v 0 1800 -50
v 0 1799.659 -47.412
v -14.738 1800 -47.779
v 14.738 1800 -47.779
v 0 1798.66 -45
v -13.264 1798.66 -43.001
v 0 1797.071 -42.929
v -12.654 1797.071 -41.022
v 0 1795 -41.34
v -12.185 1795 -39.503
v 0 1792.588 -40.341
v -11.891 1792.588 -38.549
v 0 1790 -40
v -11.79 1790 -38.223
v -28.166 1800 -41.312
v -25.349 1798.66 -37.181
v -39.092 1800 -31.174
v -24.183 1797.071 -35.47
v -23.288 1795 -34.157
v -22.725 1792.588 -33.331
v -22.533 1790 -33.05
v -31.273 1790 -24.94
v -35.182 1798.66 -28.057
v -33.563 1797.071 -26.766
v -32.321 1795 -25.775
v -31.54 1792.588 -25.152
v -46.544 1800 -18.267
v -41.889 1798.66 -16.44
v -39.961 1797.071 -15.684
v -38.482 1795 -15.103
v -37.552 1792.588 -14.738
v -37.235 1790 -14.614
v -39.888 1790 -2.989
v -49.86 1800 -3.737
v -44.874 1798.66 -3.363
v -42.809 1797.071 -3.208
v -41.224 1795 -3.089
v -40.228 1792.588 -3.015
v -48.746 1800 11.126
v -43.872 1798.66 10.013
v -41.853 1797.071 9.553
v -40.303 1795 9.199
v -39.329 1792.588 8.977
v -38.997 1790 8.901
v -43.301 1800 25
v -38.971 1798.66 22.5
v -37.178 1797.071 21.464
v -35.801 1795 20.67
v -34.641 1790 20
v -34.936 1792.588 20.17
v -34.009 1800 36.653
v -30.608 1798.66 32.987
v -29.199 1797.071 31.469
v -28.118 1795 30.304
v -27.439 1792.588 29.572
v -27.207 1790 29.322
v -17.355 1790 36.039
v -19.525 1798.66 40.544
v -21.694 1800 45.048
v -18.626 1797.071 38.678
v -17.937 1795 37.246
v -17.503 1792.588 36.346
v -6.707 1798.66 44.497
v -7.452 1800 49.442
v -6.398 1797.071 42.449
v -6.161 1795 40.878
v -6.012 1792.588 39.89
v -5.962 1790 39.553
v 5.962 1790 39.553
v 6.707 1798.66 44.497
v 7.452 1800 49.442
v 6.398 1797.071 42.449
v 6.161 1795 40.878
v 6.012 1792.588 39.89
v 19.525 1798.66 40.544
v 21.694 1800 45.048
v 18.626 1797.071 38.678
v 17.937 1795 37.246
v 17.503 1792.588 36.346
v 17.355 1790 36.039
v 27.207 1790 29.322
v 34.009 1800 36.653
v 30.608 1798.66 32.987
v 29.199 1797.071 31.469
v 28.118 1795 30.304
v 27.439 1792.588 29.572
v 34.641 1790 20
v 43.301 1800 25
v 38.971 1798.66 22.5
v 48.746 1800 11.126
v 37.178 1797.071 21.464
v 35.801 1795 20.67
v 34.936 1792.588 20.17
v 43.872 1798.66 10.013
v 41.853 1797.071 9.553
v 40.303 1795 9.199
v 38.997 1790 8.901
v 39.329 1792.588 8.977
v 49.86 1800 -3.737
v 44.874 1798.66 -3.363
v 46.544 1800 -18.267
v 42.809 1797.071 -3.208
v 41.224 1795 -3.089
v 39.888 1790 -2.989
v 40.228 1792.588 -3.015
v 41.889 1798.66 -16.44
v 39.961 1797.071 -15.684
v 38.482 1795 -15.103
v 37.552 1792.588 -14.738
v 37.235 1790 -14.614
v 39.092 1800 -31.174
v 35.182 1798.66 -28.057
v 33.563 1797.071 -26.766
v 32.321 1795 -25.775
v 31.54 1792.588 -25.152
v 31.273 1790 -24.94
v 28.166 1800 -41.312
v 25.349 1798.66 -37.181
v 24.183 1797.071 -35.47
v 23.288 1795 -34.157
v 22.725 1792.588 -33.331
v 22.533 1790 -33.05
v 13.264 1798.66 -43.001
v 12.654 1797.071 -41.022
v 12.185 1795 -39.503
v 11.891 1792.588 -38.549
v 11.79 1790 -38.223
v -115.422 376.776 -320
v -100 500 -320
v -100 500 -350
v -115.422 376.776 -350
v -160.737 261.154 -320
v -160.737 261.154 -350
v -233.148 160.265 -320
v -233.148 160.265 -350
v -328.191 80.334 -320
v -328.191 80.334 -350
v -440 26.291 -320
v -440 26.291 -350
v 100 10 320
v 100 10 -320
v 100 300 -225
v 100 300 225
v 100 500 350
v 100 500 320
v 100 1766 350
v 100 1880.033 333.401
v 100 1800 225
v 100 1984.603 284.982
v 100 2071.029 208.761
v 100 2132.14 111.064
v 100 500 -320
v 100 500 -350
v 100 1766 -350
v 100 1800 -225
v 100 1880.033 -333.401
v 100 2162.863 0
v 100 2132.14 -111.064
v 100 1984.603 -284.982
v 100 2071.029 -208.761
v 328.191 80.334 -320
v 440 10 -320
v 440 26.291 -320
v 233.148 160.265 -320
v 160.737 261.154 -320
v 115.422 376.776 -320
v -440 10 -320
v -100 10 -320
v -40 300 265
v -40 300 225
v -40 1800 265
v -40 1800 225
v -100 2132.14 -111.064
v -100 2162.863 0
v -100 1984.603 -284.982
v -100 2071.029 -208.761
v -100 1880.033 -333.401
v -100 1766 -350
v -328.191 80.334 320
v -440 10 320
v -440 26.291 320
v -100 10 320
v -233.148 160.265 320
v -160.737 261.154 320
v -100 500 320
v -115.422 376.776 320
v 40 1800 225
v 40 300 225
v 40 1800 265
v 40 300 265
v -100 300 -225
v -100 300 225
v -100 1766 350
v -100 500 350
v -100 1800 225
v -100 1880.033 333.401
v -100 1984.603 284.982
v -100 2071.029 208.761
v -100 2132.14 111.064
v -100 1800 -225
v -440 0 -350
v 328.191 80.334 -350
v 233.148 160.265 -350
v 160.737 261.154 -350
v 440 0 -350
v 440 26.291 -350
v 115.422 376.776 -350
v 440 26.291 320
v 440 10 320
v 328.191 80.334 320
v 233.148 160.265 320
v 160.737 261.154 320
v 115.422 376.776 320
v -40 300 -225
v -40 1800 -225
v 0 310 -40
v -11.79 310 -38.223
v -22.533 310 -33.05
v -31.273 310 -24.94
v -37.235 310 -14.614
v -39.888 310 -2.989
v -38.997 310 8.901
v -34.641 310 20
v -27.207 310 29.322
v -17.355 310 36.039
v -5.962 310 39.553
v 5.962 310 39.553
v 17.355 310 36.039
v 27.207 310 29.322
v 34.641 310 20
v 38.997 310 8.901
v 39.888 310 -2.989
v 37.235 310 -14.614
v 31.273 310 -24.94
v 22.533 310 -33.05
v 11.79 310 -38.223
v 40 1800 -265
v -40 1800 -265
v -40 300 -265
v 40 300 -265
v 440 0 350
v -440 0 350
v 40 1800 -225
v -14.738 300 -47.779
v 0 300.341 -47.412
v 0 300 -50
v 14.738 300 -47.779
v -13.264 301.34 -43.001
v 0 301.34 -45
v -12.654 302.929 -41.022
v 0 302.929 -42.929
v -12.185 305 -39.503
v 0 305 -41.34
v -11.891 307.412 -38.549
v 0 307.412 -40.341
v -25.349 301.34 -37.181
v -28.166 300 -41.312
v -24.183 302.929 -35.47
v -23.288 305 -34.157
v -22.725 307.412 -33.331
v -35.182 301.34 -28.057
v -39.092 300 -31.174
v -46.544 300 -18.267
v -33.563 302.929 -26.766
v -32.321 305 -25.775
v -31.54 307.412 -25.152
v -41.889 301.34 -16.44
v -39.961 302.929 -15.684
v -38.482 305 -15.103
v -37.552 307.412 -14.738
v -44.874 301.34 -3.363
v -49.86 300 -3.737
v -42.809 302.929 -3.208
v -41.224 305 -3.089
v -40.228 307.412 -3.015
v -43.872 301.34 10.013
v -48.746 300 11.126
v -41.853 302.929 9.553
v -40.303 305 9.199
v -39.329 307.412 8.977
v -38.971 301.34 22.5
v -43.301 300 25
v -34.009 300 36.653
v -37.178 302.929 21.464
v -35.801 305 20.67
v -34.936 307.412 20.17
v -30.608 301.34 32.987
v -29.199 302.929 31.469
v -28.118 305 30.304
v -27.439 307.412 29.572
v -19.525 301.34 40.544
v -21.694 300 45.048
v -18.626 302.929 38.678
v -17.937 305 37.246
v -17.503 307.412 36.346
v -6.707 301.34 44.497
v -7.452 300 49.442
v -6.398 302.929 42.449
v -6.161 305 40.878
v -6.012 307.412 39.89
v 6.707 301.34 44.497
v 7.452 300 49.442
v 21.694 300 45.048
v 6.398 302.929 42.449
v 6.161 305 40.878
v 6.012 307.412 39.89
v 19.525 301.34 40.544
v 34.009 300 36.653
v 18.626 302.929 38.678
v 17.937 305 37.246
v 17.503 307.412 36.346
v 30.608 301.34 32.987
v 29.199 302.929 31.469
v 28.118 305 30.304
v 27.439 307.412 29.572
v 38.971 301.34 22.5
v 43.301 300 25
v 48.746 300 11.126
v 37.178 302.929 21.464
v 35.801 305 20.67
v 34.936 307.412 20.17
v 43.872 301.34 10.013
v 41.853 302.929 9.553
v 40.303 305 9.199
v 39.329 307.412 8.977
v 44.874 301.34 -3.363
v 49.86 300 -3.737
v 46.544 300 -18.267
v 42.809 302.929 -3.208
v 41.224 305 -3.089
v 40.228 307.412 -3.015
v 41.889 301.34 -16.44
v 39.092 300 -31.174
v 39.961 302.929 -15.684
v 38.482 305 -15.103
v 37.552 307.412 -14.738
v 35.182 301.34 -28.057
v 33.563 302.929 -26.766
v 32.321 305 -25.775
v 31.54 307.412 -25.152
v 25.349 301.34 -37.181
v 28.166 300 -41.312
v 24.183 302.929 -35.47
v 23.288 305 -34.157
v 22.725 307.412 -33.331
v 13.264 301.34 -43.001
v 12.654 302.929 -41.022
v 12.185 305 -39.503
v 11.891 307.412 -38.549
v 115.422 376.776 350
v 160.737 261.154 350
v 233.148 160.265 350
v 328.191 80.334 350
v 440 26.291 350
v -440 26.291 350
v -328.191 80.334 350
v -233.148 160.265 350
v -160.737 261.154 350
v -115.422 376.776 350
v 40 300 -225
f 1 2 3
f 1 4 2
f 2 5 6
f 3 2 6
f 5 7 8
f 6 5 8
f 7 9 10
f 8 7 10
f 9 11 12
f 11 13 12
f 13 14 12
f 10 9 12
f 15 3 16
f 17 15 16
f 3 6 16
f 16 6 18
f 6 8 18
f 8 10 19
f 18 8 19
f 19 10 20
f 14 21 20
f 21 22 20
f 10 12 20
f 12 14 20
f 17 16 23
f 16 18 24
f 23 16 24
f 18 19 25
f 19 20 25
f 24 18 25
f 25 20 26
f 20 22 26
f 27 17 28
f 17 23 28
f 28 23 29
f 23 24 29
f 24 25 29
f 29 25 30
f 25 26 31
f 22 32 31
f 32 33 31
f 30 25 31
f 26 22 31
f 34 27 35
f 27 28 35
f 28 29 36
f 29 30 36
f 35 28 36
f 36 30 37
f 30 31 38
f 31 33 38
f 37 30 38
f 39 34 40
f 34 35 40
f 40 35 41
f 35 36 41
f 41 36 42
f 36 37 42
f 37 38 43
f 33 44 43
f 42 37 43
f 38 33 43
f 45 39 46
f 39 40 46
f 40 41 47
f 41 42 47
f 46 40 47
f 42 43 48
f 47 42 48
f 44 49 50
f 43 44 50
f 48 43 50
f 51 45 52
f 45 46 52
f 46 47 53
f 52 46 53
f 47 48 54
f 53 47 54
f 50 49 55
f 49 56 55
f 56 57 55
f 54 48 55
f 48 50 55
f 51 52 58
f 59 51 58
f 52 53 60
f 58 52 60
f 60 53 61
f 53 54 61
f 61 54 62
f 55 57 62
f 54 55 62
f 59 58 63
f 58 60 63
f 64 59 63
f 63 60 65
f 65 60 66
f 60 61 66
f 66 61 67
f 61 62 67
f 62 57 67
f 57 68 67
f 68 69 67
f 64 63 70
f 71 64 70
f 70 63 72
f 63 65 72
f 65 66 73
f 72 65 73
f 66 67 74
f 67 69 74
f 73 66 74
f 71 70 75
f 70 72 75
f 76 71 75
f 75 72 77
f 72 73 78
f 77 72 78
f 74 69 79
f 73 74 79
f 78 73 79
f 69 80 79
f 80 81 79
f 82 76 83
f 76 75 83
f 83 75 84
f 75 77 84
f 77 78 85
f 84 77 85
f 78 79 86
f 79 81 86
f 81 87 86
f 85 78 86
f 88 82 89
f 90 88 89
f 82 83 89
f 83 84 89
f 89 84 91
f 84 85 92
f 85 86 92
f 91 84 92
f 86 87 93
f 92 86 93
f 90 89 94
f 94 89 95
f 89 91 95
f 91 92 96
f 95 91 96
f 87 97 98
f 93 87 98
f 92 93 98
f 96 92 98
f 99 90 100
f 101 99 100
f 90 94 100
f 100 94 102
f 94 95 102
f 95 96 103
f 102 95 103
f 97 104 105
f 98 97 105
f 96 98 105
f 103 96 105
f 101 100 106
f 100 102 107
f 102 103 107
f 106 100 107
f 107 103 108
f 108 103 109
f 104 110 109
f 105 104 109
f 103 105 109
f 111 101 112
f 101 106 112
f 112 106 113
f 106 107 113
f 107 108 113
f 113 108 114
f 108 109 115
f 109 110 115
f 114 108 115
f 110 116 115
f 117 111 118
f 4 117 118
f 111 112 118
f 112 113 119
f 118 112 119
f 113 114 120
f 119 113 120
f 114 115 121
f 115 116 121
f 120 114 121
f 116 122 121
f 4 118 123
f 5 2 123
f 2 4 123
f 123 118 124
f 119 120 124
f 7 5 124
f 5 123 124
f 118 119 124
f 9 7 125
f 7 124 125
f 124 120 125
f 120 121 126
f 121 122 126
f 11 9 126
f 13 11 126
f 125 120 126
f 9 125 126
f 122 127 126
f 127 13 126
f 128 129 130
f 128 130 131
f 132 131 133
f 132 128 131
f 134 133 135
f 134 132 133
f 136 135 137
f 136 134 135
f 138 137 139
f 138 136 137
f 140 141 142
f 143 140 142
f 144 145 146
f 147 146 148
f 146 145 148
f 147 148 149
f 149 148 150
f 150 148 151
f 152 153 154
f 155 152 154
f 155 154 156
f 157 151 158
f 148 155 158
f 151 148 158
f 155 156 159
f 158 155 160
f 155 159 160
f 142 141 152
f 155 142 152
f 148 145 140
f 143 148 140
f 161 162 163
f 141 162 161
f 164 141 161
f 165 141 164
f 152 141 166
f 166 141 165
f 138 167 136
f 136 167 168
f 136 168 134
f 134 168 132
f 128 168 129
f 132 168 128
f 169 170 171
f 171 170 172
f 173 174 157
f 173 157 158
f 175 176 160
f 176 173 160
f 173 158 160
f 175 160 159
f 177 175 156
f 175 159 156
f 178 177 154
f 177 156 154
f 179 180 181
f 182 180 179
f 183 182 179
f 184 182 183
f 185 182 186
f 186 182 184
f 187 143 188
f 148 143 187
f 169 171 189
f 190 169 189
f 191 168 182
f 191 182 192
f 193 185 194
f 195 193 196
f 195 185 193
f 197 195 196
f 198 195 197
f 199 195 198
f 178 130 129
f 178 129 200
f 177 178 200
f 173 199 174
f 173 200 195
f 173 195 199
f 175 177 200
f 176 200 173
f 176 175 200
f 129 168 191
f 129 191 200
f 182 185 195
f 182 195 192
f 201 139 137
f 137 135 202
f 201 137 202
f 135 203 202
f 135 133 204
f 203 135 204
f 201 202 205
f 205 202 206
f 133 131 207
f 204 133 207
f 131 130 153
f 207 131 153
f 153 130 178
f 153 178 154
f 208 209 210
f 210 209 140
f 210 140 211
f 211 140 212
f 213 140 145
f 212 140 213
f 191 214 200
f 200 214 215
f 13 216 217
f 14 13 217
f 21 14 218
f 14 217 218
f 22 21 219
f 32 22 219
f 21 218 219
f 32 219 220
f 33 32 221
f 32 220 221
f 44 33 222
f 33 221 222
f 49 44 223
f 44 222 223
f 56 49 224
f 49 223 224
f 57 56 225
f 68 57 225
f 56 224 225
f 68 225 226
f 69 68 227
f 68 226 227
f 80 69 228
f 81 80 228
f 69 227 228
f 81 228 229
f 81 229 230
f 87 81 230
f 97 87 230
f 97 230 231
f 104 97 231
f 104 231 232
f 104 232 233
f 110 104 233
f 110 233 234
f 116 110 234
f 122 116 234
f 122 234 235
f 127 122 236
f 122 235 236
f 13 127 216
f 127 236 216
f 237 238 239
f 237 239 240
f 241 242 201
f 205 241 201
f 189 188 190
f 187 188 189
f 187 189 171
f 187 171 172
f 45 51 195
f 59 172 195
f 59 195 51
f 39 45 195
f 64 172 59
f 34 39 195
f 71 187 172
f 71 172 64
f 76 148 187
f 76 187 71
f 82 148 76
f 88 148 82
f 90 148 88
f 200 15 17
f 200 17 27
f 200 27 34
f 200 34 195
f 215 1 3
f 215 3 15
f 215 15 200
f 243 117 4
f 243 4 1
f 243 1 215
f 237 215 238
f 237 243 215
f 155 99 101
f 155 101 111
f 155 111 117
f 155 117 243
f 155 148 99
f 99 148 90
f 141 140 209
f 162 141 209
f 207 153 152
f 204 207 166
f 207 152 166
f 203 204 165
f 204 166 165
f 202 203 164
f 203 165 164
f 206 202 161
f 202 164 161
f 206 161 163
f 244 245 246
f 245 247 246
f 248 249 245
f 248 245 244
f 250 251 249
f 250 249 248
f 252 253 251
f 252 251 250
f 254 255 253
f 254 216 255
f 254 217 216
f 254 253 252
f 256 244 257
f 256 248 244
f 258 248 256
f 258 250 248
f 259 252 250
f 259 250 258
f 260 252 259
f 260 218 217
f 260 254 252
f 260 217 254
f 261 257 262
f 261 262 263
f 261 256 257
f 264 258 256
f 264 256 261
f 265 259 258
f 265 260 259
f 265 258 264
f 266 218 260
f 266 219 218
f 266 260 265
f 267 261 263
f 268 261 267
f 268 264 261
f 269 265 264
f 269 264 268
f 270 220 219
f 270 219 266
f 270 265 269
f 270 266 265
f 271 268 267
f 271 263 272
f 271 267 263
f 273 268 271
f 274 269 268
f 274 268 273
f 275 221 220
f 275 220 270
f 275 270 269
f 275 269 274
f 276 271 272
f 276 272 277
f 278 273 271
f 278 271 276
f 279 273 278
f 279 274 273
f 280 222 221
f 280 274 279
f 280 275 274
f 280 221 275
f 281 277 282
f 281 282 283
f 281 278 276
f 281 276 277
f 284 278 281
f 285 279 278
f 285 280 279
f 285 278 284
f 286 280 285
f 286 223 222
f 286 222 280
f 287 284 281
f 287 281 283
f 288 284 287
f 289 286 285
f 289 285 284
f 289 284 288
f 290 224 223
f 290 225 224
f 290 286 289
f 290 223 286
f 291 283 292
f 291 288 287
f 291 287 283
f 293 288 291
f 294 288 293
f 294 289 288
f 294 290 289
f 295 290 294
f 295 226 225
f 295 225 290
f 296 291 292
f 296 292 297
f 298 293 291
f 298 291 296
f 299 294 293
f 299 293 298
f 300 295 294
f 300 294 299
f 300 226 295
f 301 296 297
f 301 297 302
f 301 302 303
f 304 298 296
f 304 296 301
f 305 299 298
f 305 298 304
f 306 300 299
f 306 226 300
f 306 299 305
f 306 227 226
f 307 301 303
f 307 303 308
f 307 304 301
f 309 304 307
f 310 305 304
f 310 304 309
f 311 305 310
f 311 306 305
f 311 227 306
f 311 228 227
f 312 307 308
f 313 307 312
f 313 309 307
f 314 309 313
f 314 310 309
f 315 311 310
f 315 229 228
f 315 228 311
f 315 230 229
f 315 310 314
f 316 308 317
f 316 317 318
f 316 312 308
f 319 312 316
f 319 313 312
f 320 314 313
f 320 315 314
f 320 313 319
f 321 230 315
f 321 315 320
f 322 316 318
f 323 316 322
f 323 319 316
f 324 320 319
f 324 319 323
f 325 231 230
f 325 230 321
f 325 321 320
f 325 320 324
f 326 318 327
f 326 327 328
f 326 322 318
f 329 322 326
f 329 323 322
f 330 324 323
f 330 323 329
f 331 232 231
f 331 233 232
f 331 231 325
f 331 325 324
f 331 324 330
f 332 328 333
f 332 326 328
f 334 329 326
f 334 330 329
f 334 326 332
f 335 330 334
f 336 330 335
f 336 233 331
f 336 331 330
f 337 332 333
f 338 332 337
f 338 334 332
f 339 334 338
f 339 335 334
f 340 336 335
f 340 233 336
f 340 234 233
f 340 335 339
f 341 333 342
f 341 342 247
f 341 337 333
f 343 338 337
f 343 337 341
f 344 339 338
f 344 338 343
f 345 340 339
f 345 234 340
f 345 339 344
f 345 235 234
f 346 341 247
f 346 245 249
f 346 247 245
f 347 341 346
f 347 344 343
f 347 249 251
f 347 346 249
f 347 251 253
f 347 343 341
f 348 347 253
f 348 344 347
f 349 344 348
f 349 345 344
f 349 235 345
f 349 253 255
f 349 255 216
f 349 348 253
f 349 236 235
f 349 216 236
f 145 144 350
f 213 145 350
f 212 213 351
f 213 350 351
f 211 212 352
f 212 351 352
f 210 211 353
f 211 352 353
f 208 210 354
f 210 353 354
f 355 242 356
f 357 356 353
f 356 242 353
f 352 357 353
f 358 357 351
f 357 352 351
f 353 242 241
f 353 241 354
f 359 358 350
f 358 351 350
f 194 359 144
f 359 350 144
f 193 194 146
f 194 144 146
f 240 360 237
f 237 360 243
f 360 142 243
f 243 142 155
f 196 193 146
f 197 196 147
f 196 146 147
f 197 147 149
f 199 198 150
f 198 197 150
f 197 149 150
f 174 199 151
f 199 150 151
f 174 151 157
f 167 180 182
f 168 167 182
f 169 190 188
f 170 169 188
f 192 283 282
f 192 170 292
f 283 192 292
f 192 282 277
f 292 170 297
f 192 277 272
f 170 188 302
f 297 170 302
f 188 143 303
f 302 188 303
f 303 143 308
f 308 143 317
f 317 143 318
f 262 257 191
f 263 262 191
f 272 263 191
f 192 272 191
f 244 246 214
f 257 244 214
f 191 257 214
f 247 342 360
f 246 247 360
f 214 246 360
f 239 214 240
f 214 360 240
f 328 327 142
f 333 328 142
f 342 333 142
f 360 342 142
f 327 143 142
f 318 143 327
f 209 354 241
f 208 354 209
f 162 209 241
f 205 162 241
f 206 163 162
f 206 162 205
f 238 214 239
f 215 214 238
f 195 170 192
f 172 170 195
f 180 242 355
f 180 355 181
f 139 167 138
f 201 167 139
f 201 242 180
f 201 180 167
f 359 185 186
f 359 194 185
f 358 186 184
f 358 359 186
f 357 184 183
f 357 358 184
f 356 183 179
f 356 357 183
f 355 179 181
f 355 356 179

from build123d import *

# Parameters (mm, degrees)
AUFSATZ_LINEAR_AUSTRAGEN1_DEPTH             = 350
AUFSATZ_LINEAR_AUSTRAGEN1_DEPTH_BACK        = 350
SKIZZE1_W                                   = 200
SKIZZE1_H                                   = 2166
VERRUNDUNG1_R                               = 400
SKIZZE2_W                                   = 450
SKIZZE2_H                                   = 1500
SCHNITT_LINEAR_AUSTRAGEN1_DEPTH             = 200
SKIZZE4_W                                   = 80
SKIZZE4_H                                   = 1500
SCHNITT_LINEAR_AUSTRAGEN2_DEPTH             = 40
SKIZZE5_R                                   = 40
AUFSATZ_LINEAR_AUSTRAGEN2_DEPTH             = 1500
VERRUNDUNG2_R                               = 10
SKIZZE6_W                                   = 30
SKIZZE6_H                                   = 500
AUFSATZ_LINEAR_AUSTRAGEN3_DEPTH             = 500
SKIZZE7_W                                   = 1200
SKIZZE7_H                                   = 700
AUFSATZ_LINEAR_AUSTRAGEN4_DEPTH             = 10
SCHNITT_LINEAR_AUSTRAGEN3_DEPTH             = 2352.164614527
SCHNITT_LINEAR_AUSTRAGEN4_REACH             = 2264.149
SKIZZE10_W                                  = 160
SKIZZE10_H                                  = 700
SCHNITT_LINEAR_AUSTRAGEN4_DIRECTION_2_DEPTH = 2263.148932027


with BuildPart() as part:
    # Skizze1 → Aufsatz-Linear austragen1 (new, two sides: drawn at the far end of the back side and taken through both)
    with BuildSketch(Plane.XY.offset(-AUFSATZ_LINEAR_AUSTRAGEN1_DEPTH_BACK)):
        with Locations((0, 1083)):
            Rectangle(SKIZZE1_W, SKIZZE1_H)
    extrude(amount=AUFSATZ_LINEAR_AUSTRAGEN1_DEPTH + AUFSATZ_LINEAR_AUSTRAGEN1_DEPTH_BACK)

    # Verrundung1
    # the kernel refuses this fillet: 400 mm, written as the material it takes off along each edge
    with BuildSketch(Plane(origin=(1100, 2166, -350), x_dir=(0, -1, 0), z_dir=(-1, 0, 0)), Plane(origin=(1100, 2166, 350), x_dir=(0, 0, -1), z_dir=(-1, 0, 0))) as verrundung1_piece_1:
        with BuildLine():
            CenterArc((VERRUNDUNG1_R, VERRUNDUNG1_R), VERRUNDUNG1_R, 180, 90)
            Line((0, VERRUNDUNG1_R), (0, 0))
            Line((0, 0), (VERRUNDUNG1_R, 0))
        make_face()
    extrude(amount=2200, mode=Mode.SUBTRACT)

    # Skizze2 → Schnitt-Linear austragen1 (cut)
    with BuildSketch(Plane(origin=(100, 0, 0), x_dir=(0, 0, -1), z_dir=(1, 0, 0))):
        with Locations((0, 1050)):
            Rectangle(SKIZZE2_W, SKIZZE2_H)
    extrude(amount=-SCHNITT_LINEAR_AUSTRAGEN1_DEPTH, mode=Mode.SUBTRACT)

    # Skizze4 → Schnitt-Linear austragen2 (cut)
    with BuildSketch(Plane.XY.offset(-225)):
        with Locations((0, 1050)):
            Rectangle(SKIZZE4_W, SKIZZE4_H)
    schnitt_linear_austragen2 = extrude(amount=-SCHNITT_LINEAR_AUSTRAGEN2_DEPTH, mode=Mode.SUBTRACT)

    # Spiegeln1: Schnitt-Linear austragen2 across plane
    add(schnitt_linear_austragen2.mirror(Plane.XY), mode=Mode.SUBTRACT)

    # Skizze5 → Aufsatz-Linear austragen2 (add)
    with BuildSketch(Plane(origin=(0, 300, 0), x_dir=(1, 0, 0), z_dir=(0, 1, 0))):
        with Locations(Location((0, 0, 0), (0, 0, 90))):
            Circle(SKIZZE5_R)
    extrude(amount=AUFSATZ_LINEAR_AUSTRAGEN2_DEPTH)

    # Verrundung2
    verrundung2_edges = [part.edges().sort_by_distance(p)[0] for p in [
        (0, 300, 40),
        (0, 1800, 40),
    ]]
    fillet(verrundung2_edges, radius=VERRUNDUNG2_R)

    # Skizze6 → Aufsatz-Linear austragen3 (add)
    with BuildSketch(Plane(origin=(100, 0, 0), x_dir=(0, 0, -1), z_dir=(1, 0, 0))):
        with Locations((-335, 250)):
            Rectangle(SKIZZE6_W, SKIZZE6_H)
        with Locations((335, 250)):
            Rectangle(SKIZZE6_W, SKIZZE6_H)
    aufsatz_linear_austragen3 = extrude(amount=AUFSATZ_LINEAR_AUSTRAGEN3_DEPTH)

    # Spiegeln2: Aufsatz-Linear austragen3 across plane
    add(aufsatz_linear_austragen3.mirror(Plane(origin=(0, 0, 0), x_dir=(0, 0, 1), z_dir=(1, 0, 0))))

    # Skizze7 → Aufsatz-Linear austragen4 (add)
    with BuildSketch(Plane.XZ):
        Rectangle(SKIZZE7_W, SKIZZE7_H)
    extrude(amount=-AUFSATZ_LINEAR_AUSTRAGEN4_DEPTH)

    # Skizze9 → Schnitt-Linear austragen3 (cut, symmetric)
    with BuildSketch(Plane.XY.offset(350)):
        with BuildLine():
            Line((100, 5456.908143316), (100, 500))
            ThreePointArc((100, 500), (246.446609407, 146.446609407), (600, 0))
            Line((600, 0), (5556.908143316, 0))
            Line((5556.908143316, 0), (12567.034867032, 7010.126723715))
            Line((12567.034867032, 7010.126723715), (7110.126723715, 12467.034867032))
            Line((7110.126723715, 12467.034867032), (100, 5456.908143316))
        make_face()
    schnitt_linear_austragen3 = extrude(amount=SCHNITT_LINEAR_AUSTRAGEN3_DEPTH, both=True, mode=Mode.SUBTRACT)

    # Spiegeln3: Schnitt-Linear austragen3 across plane
    add(schnitt_linear_austragen3.mirror(Plane(origin=(0, 0, 0), x_dir=(0, 0, 1), z_dir=(1, 0, 0))), mode=Mode.SUBTRACT)

    # Schnitt-Linear austragen4: up to this face of the body (flat: up to its plane)
    schnitt_linear_austragen4_end = Plane(part.part.faces().sort_by_distance((0, 0, 0))[0])
    # Skizze10 → Schnitt-Linear austragen4 (cut, up to the picked face)
    with BuildSketch(Plane(origin=(0, 10, 0), x_dir=(1, 0, 0), z_dir=(0, 1, 0)), mode=Mode.PRIVATE) as schnitt_linear_austragen4_sk1:
        with Locations((520, 0)):
            Rectangle(SKIZZE10_W, SKIZZE10_H)
    schnitt_linear_austragen4_tool1 = split(extrude(schnitt_linear_austragen4_sk1.sketch, amount=-SCHNITT_LINEAR_AUSTRAGEN4_REACH, mode=Mode.PRIVATE), bisect_by=schnitt_linear_austragen4_end, keep=Keep.BOTH, mode=Mode.PRIVATE)
    schnitt_linear_austragen4 = schnitt_linear_austragen4_tool1.solids().sort_by(Axis((520, 10, 0), (0, -1, 0)))[0]
    add(schnitt_linear_austragen4, mode=Mode.SUBTRACT)

    # Skizze10 → Schnitt-Linear austragen4 direction 2 (cut)
    with BuildSketch(Plane(origin=(0, 10, 0), x_dir=(1, 0, 0), z_dir=(0, 1, 0))):
        with Locations((520, 0)):
            Rectangle(SKIZZE10_W, SKIZZE10_H)
    schnitt_linear_austragen4_direction_2 = extrude(amount=SCHNITT_LINEAR_AUSTRAGEN4_DIRECTION_2_DEPTH, mode=Mode.SUBTRACT)

    # Spiegeln4: Schnitt-Linear austragen4, Schnitt-Linear austragen4 direction 2 across plane
    add(schnitt_linear_austragen4.mirror(Plane(origin=(0, 0, 0), x_dir=(0, 0, 1), z_dir=(1, 0, 0))), mode=Mode.SUBTRACT)
    add(schnitt_linear_austragen4_direction_2.mirror(Plane(origin=(0, 0, 0), x_dir=(0, 0, 1), z_dir=(1, 0, 0))), mode=Mode.SUBTRACT)


solid = part.part
